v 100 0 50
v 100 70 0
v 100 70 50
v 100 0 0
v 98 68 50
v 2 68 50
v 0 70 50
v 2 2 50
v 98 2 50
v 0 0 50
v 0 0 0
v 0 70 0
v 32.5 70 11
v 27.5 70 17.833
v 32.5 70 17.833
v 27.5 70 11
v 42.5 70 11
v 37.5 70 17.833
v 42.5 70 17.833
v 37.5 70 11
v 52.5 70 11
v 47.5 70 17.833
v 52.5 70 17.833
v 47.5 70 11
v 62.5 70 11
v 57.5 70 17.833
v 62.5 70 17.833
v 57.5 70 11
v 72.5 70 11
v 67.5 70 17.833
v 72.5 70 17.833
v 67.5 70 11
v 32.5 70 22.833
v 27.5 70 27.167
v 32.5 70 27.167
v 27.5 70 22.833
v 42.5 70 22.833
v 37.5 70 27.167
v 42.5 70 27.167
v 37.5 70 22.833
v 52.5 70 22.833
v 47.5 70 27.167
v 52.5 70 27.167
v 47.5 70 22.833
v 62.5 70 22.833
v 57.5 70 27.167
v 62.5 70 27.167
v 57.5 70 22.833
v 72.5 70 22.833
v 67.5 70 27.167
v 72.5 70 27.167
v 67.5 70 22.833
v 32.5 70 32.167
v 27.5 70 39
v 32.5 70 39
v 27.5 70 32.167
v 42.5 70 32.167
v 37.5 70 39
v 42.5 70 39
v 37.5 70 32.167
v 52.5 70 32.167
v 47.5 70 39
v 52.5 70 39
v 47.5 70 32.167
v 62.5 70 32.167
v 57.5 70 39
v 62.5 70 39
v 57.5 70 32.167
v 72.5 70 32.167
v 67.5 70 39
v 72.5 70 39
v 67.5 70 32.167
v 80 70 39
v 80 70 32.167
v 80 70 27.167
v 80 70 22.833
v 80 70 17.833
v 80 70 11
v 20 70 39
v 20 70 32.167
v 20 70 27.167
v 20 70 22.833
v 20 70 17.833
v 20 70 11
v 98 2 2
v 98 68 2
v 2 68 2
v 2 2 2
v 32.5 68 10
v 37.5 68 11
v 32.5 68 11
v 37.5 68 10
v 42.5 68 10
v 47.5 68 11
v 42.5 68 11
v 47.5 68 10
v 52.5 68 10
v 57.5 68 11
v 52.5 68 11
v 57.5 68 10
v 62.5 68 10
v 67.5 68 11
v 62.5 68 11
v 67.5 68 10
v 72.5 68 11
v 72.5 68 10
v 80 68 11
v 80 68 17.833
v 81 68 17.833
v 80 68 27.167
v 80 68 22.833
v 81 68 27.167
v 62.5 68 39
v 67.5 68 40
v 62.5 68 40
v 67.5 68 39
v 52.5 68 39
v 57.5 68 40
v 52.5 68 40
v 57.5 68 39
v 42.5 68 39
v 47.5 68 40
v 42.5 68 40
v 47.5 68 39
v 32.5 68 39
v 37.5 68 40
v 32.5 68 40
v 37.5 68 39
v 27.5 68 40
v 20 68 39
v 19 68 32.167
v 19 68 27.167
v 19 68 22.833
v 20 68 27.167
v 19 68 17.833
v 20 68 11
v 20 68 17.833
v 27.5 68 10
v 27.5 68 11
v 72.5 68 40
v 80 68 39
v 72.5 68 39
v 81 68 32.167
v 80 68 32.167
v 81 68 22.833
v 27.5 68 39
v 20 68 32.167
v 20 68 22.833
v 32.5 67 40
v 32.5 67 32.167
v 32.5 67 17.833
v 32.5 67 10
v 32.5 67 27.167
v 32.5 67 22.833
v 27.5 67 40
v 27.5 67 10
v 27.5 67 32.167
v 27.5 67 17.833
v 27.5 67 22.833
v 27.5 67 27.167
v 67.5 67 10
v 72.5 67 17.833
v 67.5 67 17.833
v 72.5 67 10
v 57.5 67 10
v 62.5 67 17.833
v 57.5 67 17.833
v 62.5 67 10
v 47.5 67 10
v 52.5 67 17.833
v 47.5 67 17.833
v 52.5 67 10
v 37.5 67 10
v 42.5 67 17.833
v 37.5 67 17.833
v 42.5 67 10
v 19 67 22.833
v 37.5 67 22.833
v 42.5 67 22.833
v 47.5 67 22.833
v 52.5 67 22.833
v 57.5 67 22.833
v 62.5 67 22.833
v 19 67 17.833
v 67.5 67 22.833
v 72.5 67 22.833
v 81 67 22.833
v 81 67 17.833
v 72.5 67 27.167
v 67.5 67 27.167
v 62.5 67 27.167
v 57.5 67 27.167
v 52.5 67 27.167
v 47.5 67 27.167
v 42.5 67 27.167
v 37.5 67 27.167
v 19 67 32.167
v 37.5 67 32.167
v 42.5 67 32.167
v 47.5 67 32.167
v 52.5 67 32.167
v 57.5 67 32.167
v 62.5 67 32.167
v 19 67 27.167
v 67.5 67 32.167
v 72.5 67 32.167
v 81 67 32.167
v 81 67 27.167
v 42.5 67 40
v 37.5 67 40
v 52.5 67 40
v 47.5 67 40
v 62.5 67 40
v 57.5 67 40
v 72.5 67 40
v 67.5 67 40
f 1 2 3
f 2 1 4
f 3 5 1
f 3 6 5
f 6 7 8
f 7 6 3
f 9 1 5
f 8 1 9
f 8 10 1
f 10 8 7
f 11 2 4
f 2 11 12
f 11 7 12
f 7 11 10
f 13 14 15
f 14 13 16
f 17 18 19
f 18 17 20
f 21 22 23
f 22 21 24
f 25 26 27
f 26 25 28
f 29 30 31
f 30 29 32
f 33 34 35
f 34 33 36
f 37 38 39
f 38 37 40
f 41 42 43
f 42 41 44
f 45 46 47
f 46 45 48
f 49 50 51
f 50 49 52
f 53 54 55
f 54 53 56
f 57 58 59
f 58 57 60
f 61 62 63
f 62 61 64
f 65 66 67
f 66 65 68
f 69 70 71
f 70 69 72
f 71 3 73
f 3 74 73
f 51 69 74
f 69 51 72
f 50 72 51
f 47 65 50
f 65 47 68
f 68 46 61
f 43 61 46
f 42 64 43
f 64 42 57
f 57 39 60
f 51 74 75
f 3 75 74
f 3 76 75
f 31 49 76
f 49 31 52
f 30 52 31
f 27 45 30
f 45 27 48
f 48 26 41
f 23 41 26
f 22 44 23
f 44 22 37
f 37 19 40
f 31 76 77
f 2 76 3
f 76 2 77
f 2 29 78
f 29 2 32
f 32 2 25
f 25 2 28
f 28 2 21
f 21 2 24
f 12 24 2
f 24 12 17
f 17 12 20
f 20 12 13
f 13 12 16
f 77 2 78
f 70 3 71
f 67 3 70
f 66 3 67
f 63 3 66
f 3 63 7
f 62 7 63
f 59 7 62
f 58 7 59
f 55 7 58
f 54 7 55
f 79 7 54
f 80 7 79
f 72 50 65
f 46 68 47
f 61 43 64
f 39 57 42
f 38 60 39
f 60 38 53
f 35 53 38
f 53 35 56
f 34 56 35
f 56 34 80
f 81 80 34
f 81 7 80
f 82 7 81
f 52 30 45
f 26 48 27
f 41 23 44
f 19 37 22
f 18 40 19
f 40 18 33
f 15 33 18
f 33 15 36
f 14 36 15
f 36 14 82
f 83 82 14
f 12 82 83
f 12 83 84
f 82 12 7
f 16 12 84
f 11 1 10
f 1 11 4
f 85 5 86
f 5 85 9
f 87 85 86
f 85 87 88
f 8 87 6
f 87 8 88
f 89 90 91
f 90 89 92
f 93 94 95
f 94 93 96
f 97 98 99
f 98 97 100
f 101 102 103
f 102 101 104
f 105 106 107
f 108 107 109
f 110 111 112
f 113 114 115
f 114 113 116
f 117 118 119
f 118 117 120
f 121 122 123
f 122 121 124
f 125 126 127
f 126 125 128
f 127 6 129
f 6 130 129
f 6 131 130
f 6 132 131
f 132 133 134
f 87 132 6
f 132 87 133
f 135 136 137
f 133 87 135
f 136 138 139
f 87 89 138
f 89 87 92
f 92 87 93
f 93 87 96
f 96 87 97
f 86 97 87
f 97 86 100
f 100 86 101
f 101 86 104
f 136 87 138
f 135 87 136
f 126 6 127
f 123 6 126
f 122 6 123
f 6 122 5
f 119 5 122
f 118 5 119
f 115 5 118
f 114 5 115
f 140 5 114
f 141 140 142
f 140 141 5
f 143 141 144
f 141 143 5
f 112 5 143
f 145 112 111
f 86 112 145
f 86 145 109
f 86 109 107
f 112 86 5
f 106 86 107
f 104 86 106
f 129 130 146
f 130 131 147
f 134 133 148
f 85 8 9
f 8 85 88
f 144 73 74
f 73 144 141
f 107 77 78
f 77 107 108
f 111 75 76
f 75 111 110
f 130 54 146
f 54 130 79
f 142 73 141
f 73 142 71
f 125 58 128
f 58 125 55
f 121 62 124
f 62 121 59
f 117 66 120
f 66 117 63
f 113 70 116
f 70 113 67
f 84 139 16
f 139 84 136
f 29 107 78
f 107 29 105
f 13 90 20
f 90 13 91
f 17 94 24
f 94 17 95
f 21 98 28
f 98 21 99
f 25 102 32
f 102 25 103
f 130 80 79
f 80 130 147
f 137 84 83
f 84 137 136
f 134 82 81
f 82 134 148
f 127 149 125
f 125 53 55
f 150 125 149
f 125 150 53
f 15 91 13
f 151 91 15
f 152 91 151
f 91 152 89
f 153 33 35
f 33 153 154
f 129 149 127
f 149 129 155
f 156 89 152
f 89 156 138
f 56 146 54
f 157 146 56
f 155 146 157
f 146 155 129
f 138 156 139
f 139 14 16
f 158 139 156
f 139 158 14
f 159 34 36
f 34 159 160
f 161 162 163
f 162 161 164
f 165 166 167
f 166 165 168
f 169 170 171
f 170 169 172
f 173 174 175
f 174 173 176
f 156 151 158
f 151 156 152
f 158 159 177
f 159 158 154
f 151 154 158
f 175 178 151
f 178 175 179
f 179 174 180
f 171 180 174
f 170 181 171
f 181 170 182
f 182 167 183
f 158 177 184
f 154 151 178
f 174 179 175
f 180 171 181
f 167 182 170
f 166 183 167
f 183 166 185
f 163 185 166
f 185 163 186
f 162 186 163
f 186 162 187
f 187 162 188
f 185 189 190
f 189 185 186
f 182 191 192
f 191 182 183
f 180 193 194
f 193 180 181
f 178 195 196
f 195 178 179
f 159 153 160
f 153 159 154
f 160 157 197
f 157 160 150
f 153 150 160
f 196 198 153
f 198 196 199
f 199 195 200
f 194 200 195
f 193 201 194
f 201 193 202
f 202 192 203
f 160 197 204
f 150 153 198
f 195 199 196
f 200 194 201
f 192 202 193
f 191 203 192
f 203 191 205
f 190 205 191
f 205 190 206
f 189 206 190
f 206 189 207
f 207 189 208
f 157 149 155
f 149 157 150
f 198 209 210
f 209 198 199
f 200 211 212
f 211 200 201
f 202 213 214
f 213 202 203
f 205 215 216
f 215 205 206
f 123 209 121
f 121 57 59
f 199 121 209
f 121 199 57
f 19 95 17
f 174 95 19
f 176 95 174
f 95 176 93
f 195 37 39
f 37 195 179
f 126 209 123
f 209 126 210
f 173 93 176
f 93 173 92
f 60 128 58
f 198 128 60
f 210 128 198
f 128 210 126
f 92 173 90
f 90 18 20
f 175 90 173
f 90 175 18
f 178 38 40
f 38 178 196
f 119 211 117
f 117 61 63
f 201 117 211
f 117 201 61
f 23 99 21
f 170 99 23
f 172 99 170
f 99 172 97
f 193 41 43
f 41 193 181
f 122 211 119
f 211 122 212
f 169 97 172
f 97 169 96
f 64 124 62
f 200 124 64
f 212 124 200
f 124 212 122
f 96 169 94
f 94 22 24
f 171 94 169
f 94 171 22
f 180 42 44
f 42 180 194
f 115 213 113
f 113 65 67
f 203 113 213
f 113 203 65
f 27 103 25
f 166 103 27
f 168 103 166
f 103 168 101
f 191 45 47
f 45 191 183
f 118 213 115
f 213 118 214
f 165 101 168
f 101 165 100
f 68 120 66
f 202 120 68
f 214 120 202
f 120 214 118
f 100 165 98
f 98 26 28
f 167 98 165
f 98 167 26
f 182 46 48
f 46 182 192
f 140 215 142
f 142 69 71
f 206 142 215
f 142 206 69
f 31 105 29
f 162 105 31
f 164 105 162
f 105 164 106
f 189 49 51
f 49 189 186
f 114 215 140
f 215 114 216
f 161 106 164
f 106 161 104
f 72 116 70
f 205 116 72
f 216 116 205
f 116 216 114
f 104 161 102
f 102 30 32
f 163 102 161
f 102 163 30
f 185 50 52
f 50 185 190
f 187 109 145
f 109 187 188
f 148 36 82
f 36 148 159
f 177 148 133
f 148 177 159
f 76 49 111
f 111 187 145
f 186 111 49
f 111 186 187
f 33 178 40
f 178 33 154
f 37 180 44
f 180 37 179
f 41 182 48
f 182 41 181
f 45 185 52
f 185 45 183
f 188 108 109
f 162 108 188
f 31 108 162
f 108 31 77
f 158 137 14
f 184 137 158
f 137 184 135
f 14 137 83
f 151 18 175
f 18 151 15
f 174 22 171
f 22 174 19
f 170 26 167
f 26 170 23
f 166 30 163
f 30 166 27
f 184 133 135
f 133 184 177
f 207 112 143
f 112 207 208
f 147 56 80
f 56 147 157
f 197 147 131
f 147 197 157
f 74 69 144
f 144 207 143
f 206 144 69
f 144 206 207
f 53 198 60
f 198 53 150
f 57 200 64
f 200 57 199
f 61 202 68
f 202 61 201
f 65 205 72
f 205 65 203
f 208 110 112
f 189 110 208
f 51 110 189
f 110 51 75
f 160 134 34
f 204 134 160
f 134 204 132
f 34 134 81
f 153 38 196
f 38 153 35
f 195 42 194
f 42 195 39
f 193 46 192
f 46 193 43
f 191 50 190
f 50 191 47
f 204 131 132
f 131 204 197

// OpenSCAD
$fn = 32;
// target_bbox: 100, 70, 50
// ----------------------------------------------------------------------
// Vent box: crossgrid enclosure
// ----------------------------------------------------------------------

// --- parameters (mm) ---
box_l = 100;              // box length, X
box_w = 70;               // box width, Y
box_h = 50;               // box height, Z
wall_t = 2;               // shell wall thickness
win_l = 60;               // vent window width, X
win_h = 28;               // vent window height, Z
bar_w = 5;                // grid bar width
n_v = 5;                  // vertical bar count
n_h = 2;                  // horizontal bar count
fit_tol = 0.05;           // tolerance for press fits, mm
free_tol = 0.2;           // tolerance for clearance fits, mm

win_z0 = (box_h - win_h) / 2;  // window lower edge Z
v_step = win_l / (n_v + 1);  // vertical bar step
h_step = win_h / (n_h + 1);  // horizontal bar step

difference() {
  union() {
    difference() {
      cube([box_l, box_w, box_h]);
  translate([wall_t, wall_t, wall_t])
    cube([box_l - 2 * wall_t, box_w - 2 * wall_t, box_h]);
  translate([(box_l - win_l) / 2, box_w - wall_t - 1, win_z0])
    cube([win_l, wall_t + 2, win_h]);
    }
    for (i = [1 : n_v])
      translate([(box_l - win_l) / 2 + i * v_step - bar_w / 2,
                 box_w - wall_t - 1, win_z0 - 1])
        cube([bar_w, wall_t + 1, win_h + 2]);
    for (i = [1 : n_h])
      translate([(box_l - win_l) / 2 - 1, box_w - wall_t - 1,
                 win_z0 + i * h_step - bar_w / 2])
        cube([win_l + 2, wall_t + 1, bar_w]);
  }
}
